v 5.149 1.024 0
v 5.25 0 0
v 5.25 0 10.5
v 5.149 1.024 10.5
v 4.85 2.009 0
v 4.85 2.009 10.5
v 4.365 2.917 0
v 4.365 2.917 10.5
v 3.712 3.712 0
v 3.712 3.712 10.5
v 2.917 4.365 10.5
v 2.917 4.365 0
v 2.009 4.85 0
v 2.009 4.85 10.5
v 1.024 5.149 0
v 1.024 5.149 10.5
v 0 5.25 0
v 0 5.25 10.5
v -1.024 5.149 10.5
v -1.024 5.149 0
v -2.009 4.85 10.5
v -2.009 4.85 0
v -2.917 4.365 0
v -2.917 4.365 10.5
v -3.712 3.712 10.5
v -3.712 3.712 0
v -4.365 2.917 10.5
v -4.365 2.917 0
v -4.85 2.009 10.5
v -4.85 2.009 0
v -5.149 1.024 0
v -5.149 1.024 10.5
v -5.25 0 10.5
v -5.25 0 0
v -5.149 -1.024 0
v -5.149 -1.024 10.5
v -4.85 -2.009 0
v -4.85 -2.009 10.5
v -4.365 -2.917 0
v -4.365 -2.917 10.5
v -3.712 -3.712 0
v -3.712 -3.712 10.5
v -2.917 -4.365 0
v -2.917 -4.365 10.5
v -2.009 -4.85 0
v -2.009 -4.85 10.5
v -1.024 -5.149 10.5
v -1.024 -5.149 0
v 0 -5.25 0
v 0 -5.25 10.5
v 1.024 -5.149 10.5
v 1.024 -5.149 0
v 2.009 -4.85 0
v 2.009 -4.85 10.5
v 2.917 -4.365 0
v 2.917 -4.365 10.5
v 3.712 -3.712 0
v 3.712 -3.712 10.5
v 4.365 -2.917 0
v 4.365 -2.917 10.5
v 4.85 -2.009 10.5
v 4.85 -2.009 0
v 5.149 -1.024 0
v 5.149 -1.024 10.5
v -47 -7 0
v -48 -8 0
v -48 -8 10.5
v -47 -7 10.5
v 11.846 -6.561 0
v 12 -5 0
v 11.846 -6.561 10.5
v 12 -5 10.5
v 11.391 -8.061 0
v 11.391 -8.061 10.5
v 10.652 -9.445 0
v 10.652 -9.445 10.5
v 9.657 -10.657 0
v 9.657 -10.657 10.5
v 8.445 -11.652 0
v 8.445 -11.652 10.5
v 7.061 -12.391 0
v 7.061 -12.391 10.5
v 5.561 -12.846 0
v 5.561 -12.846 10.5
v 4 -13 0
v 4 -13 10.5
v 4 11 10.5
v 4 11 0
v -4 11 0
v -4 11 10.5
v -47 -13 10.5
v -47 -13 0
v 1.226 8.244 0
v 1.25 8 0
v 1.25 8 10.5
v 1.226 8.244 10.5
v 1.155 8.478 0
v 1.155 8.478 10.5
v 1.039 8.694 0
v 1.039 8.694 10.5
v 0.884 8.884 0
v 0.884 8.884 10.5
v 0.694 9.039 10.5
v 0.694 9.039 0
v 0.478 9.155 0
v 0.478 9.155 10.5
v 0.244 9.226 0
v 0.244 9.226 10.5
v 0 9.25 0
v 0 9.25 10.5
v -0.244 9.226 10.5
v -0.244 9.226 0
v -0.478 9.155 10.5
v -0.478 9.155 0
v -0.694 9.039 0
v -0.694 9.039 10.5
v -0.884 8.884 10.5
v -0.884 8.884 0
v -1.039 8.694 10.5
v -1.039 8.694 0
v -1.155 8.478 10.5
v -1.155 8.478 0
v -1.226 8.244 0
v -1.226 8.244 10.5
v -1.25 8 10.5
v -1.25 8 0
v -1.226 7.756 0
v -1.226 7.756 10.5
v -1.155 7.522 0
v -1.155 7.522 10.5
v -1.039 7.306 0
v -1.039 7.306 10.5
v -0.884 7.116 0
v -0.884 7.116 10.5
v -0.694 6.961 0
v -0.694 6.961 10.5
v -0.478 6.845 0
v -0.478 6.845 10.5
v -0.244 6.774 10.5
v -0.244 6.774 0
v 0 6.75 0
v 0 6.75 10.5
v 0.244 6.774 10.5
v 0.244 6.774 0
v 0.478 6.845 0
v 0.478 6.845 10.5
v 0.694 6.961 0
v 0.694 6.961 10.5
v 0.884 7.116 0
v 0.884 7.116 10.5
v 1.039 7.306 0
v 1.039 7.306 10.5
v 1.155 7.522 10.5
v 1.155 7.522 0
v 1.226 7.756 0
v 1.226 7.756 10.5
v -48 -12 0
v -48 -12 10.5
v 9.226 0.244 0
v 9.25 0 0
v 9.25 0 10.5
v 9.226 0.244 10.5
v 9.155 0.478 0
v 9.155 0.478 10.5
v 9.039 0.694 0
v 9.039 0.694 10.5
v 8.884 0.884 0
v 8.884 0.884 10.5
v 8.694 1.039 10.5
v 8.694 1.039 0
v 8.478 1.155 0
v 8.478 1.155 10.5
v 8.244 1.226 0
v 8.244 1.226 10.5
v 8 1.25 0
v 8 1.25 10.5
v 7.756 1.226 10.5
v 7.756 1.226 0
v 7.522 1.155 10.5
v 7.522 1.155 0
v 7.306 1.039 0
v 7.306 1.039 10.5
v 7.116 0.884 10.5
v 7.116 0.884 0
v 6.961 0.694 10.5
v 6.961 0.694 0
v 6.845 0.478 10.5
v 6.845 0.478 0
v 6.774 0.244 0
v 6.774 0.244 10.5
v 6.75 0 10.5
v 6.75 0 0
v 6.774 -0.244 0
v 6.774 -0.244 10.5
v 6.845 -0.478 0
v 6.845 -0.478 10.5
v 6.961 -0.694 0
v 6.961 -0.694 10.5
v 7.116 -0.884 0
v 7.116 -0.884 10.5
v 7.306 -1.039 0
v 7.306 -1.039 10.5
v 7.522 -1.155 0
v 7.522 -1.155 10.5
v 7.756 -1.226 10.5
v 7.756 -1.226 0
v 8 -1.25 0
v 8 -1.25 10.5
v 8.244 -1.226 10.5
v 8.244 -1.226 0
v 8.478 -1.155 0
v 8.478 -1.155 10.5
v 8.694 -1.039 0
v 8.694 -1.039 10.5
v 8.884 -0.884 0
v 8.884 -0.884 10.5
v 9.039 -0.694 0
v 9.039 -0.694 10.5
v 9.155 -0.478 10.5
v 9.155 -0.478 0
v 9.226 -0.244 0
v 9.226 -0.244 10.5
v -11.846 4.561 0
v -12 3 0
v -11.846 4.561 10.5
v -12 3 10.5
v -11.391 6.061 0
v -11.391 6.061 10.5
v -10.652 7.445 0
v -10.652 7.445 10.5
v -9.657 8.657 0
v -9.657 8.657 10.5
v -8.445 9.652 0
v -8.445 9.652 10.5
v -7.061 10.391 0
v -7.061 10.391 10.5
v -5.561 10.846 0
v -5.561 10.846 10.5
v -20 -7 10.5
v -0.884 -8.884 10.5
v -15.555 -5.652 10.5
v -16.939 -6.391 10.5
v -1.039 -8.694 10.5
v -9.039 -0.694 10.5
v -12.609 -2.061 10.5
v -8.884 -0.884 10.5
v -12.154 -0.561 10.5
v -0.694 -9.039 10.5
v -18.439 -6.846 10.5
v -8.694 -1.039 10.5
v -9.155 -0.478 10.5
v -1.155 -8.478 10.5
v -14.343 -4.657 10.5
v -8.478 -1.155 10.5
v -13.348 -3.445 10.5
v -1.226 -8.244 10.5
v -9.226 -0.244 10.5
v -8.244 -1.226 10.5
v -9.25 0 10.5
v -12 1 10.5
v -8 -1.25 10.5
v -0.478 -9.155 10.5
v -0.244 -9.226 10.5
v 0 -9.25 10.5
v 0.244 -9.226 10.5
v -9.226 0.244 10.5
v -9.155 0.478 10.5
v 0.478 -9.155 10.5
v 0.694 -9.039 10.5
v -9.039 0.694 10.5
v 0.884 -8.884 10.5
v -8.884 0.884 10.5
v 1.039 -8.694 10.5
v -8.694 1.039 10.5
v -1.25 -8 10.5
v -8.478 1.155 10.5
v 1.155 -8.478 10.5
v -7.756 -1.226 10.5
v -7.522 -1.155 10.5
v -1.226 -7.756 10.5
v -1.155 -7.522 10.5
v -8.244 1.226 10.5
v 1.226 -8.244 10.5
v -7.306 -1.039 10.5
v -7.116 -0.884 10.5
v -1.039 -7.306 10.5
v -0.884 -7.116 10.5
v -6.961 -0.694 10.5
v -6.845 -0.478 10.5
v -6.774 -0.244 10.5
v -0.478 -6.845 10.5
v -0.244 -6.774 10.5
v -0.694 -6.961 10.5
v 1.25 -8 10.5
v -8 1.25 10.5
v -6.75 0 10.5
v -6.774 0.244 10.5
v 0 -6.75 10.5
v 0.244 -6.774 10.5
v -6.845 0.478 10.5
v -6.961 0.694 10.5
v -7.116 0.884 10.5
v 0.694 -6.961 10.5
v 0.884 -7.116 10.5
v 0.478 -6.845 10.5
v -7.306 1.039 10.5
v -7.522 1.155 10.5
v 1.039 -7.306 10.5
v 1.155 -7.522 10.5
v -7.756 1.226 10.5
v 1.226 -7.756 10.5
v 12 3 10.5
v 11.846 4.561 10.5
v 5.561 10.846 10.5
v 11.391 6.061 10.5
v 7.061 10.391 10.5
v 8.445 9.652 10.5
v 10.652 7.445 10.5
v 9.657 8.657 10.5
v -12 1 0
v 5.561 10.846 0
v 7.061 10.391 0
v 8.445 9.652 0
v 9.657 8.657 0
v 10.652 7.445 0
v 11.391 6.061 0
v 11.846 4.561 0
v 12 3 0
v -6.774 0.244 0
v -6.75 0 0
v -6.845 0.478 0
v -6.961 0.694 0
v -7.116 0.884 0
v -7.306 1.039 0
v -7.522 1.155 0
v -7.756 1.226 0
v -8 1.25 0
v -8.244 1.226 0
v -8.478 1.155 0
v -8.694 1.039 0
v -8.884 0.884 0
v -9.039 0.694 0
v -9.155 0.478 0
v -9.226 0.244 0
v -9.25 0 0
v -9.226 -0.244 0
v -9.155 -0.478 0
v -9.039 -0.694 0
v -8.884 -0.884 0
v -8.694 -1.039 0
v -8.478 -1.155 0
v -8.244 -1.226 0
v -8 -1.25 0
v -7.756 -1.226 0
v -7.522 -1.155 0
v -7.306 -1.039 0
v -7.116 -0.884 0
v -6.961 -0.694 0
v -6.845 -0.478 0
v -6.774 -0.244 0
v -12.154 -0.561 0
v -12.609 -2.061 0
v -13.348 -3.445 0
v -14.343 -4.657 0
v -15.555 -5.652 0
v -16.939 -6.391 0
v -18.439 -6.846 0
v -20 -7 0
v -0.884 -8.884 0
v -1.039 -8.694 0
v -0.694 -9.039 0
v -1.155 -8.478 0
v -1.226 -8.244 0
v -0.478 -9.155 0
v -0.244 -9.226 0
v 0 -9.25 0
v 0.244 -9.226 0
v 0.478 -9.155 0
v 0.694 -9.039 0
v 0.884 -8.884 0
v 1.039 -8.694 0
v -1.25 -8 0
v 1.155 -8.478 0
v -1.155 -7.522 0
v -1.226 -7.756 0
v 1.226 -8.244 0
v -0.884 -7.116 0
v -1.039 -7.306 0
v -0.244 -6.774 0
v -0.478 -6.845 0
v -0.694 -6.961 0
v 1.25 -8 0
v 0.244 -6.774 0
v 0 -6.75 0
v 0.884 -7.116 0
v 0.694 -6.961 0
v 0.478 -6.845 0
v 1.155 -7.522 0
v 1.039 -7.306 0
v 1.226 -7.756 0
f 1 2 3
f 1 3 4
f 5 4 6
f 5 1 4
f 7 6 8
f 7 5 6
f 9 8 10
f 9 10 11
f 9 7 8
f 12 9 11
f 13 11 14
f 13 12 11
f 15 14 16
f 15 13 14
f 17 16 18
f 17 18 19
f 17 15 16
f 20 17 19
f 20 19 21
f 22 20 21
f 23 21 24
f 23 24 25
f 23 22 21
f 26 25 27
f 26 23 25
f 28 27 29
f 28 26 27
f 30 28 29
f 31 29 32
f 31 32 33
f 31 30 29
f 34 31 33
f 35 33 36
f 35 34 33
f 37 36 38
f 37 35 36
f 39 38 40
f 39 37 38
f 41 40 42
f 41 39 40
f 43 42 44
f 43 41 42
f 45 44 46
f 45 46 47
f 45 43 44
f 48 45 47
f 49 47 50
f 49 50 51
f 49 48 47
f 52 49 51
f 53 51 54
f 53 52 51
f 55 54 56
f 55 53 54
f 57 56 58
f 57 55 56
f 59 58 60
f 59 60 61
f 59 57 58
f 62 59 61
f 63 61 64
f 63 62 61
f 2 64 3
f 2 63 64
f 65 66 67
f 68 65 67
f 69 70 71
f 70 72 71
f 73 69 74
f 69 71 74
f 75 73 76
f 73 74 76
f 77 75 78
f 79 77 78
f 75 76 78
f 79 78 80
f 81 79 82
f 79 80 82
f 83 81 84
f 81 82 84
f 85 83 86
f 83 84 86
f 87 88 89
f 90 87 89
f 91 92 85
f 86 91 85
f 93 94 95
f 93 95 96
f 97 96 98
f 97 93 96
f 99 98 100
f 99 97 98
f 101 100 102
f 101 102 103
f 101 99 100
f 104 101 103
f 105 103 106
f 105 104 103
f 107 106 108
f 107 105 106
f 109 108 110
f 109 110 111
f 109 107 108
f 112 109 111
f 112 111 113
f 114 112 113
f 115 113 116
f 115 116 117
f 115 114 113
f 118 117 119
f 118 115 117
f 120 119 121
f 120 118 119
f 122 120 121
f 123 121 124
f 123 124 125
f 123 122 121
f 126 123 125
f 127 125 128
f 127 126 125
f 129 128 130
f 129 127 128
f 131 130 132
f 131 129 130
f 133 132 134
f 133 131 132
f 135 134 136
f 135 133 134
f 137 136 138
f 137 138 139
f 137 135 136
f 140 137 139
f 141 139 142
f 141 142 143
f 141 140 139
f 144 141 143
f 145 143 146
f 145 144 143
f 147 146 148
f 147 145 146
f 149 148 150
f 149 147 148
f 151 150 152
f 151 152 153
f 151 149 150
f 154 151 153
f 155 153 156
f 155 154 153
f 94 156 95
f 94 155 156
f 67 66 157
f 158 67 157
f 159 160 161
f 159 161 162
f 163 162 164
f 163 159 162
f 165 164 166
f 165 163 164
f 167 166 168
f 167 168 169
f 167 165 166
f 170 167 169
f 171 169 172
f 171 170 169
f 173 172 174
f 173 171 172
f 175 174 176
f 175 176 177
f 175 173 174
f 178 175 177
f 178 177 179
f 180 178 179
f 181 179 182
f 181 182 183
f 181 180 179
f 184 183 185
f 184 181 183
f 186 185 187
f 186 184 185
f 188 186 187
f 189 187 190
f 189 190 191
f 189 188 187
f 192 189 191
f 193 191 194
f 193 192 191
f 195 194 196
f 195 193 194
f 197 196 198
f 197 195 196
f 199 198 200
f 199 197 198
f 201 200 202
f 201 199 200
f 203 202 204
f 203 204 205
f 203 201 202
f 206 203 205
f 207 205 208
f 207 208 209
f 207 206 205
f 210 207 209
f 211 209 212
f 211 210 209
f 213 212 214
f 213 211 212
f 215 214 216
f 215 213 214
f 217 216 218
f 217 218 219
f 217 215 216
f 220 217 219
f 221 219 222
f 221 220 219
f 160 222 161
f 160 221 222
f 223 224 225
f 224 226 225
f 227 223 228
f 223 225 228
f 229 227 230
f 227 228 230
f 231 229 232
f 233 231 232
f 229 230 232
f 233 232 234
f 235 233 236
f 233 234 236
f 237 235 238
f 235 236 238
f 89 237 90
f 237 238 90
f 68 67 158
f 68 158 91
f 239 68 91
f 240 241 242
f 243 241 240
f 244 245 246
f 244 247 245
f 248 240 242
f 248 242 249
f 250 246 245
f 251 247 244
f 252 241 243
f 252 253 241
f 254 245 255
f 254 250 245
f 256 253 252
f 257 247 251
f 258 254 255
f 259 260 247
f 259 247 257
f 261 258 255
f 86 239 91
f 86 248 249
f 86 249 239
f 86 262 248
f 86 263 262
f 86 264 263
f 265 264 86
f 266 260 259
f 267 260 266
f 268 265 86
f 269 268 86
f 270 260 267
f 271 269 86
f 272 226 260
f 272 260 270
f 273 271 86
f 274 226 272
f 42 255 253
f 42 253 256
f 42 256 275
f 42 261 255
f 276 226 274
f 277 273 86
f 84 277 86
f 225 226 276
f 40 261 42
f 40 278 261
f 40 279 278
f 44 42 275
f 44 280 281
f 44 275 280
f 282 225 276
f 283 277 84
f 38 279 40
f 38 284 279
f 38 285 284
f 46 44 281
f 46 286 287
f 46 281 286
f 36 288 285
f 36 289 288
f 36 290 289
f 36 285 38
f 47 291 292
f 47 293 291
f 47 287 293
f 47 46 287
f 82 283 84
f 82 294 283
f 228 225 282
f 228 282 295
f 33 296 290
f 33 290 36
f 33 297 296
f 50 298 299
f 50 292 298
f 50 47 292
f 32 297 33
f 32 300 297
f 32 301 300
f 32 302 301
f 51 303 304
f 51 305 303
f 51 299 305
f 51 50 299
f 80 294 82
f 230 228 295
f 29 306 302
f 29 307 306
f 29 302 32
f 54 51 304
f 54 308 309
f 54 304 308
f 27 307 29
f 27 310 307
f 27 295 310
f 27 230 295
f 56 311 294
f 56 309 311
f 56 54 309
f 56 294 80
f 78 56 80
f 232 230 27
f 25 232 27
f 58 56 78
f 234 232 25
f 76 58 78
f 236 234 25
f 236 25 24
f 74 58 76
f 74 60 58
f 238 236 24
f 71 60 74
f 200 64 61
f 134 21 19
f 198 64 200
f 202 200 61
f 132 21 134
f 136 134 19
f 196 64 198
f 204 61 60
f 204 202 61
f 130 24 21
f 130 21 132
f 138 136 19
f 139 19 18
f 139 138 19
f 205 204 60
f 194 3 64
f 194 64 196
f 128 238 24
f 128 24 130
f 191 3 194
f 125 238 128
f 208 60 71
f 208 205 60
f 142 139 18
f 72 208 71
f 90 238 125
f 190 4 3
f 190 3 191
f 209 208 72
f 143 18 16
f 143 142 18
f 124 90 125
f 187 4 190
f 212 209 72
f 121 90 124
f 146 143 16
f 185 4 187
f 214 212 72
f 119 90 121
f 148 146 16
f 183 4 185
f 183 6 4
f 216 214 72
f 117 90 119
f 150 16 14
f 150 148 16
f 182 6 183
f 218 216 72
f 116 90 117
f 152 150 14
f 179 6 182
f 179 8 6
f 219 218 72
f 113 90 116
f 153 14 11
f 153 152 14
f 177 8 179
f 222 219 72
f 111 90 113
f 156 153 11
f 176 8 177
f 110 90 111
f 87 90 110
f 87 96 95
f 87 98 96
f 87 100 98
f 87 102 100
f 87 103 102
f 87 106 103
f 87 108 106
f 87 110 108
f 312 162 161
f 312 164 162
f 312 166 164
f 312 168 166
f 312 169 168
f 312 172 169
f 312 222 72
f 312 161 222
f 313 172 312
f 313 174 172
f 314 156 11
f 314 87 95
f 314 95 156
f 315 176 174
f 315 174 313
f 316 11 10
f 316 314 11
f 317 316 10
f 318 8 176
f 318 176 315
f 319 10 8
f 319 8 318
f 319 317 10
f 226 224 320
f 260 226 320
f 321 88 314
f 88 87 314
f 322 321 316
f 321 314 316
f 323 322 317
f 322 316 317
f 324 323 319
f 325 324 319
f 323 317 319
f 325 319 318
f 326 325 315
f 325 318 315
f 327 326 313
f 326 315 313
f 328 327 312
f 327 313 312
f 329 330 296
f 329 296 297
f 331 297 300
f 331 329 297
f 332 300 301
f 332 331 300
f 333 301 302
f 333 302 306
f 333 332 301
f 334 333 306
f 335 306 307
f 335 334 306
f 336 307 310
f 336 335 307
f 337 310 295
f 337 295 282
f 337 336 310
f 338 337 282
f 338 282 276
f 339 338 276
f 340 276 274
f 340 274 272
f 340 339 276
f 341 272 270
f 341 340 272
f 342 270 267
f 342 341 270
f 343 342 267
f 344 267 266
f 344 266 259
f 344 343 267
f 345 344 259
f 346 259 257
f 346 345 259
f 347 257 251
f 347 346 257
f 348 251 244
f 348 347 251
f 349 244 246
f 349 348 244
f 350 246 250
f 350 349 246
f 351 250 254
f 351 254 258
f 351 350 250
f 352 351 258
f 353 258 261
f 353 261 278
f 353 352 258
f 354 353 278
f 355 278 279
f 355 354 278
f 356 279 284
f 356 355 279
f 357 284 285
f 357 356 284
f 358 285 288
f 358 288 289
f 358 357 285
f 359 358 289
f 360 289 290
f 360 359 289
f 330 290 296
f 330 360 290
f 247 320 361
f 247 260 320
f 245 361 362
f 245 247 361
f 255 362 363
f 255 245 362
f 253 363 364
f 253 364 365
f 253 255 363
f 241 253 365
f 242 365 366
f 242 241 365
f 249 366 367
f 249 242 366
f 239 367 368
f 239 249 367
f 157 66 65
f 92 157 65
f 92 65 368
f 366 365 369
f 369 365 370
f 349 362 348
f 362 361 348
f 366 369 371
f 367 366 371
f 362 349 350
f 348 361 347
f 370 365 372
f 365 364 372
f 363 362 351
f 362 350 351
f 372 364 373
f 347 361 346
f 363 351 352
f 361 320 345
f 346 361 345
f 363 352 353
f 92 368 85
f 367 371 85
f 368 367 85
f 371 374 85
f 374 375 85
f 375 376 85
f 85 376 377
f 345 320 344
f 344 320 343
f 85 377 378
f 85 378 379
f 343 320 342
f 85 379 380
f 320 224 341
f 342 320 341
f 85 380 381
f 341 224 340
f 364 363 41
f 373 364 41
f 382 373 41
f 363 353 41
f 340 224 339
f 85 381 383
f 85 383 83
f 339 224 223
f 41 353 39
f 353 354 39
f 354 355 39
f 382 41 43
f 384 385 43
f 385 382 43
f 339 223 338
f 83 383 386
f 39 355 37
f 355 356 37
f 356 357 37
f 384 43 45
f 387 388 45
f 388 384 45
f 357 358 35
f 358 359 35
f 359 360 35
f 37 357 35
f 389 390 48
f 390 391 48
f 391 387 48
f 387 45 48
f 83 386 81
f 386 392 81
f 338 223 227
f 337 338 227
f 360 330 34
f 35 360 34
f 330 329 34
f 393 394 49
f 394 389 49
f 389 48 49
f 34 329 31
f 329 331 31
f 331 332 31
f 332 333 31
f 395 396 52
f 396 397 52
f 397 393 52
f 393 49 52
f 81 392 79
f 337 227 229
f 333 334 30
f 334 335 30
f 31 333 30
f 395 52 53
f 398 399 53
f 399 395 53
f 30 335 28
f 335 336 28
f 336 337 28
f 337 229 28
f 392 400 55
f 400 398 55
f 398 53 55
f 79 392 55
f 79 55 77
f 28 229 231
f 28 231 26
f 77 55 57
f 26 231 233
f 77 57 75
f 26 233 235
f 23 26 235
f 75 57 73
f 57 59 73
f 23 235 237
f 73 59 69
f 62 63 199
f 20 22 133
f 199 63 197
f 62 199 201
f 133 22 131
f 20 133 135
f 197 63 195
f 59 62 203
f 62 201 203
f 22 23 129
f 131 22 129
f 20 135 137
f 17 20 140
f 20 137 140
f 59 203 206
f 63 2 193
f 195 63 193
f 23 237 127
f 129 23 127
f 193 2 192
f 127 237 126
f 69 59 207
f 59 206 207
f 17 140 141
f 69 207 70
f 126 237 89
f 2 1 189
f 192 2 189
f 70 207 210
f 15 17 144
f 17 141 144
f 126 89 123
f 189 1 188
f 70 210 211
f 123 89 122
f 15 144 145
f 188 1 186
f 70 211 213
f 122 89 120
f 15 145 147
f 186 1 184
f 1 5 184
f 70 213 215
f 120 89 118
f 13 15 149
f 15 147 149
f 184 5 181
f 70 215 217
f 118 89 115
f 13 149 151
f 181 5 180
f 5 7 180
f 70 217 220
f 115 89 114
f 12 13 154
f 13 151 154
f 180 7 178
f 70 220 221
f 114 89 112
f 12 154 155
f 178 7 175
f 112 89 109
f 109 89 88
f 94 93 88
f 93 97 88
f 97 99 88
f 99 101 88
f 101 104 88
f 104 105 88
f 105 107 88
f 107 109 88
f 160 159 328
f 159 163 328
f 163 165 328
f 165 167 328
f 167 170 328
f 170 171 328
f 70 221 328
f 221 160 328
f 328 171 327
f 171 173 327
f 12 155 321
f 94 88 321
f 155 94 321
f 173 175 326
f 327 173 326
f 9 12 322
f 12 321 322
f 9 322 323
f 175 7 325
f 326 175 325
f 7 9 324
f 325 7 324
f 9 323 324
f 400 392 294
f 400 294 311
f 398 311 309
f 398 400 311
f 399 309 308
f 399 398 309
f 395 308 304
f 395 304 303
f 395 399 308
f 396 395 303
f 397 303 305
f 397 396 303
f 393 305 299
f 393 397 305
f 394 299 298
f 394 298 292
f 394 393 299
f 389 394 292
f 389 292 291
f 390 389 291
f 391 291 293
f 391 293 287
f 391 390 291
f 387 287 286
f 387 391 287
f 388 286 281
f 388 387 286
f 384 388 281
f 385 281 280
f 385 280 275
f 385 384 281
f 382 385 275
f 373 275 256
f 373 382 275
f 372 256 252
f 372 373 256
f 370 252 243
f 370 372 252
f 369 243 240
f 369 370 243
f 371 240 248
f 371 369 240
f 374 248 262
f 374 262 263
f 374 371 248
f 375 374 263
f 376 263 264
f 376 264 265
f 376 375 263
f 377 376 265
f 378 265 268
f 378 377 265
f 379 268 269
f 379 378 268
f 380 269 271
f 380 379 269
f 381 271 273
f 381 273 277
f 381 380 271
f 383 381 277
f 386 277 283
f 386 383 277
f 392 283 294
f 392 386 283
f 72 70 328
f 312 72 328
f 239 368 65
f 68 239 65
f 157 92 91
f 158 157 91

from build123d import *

# Parameters (mm, degrees)
F0_R     = 1.25
F0_R_2   = 5.25
F1_DEPTH = 10.5
F2_R     = 8
F3_SIZE  = 1


with BuildPart() as f1:
    # F0 (on Top) → F1 (new body)
    with BuildSketch(Plane.XY):
        Polygon((-12, 11), (-12, -7), (-48, -7), (-48, -13), (12, -13), (12, 11), align=None)
        with Locations((0, -8)):
            Circle(F0_R, mode=Mode.SUBTRACT)
        with Locations((-8, 0)):
            Circle(F0_R, mode=Mode.SUBTRACT)
        Circle(F0_R_2, mode=Mode.SUBTRACT)
        with Locations((8, 0)):
            Circle(F0_R, mode=Mode.SUBTRACT)
        with Locations((0, 8)):
            Circle(F0_R, mode=Mode.SUBTRACT)
    extrude(amount=F1_DEPTH)

    # F2
    f2_edges = [f1.edges().sort_by_distance(p)[0] for p in [
        (12, -13, 5.25),
        (12, 11, 5.25),
        (-12, 11, 5.25),
        (-12, -7, 5.25),
    ]]
    fillet(f2_edges, radius=F2_R)

    # F3
    f3_edges = [f1.edges().sort_by_distance(p)[0] for p in [
        (-48, -13, 5.25),
        (-48, -7, 5.25),
    ]]
    chamfer(f3_edges, length=F3_SIZE)


solid = f1.part
